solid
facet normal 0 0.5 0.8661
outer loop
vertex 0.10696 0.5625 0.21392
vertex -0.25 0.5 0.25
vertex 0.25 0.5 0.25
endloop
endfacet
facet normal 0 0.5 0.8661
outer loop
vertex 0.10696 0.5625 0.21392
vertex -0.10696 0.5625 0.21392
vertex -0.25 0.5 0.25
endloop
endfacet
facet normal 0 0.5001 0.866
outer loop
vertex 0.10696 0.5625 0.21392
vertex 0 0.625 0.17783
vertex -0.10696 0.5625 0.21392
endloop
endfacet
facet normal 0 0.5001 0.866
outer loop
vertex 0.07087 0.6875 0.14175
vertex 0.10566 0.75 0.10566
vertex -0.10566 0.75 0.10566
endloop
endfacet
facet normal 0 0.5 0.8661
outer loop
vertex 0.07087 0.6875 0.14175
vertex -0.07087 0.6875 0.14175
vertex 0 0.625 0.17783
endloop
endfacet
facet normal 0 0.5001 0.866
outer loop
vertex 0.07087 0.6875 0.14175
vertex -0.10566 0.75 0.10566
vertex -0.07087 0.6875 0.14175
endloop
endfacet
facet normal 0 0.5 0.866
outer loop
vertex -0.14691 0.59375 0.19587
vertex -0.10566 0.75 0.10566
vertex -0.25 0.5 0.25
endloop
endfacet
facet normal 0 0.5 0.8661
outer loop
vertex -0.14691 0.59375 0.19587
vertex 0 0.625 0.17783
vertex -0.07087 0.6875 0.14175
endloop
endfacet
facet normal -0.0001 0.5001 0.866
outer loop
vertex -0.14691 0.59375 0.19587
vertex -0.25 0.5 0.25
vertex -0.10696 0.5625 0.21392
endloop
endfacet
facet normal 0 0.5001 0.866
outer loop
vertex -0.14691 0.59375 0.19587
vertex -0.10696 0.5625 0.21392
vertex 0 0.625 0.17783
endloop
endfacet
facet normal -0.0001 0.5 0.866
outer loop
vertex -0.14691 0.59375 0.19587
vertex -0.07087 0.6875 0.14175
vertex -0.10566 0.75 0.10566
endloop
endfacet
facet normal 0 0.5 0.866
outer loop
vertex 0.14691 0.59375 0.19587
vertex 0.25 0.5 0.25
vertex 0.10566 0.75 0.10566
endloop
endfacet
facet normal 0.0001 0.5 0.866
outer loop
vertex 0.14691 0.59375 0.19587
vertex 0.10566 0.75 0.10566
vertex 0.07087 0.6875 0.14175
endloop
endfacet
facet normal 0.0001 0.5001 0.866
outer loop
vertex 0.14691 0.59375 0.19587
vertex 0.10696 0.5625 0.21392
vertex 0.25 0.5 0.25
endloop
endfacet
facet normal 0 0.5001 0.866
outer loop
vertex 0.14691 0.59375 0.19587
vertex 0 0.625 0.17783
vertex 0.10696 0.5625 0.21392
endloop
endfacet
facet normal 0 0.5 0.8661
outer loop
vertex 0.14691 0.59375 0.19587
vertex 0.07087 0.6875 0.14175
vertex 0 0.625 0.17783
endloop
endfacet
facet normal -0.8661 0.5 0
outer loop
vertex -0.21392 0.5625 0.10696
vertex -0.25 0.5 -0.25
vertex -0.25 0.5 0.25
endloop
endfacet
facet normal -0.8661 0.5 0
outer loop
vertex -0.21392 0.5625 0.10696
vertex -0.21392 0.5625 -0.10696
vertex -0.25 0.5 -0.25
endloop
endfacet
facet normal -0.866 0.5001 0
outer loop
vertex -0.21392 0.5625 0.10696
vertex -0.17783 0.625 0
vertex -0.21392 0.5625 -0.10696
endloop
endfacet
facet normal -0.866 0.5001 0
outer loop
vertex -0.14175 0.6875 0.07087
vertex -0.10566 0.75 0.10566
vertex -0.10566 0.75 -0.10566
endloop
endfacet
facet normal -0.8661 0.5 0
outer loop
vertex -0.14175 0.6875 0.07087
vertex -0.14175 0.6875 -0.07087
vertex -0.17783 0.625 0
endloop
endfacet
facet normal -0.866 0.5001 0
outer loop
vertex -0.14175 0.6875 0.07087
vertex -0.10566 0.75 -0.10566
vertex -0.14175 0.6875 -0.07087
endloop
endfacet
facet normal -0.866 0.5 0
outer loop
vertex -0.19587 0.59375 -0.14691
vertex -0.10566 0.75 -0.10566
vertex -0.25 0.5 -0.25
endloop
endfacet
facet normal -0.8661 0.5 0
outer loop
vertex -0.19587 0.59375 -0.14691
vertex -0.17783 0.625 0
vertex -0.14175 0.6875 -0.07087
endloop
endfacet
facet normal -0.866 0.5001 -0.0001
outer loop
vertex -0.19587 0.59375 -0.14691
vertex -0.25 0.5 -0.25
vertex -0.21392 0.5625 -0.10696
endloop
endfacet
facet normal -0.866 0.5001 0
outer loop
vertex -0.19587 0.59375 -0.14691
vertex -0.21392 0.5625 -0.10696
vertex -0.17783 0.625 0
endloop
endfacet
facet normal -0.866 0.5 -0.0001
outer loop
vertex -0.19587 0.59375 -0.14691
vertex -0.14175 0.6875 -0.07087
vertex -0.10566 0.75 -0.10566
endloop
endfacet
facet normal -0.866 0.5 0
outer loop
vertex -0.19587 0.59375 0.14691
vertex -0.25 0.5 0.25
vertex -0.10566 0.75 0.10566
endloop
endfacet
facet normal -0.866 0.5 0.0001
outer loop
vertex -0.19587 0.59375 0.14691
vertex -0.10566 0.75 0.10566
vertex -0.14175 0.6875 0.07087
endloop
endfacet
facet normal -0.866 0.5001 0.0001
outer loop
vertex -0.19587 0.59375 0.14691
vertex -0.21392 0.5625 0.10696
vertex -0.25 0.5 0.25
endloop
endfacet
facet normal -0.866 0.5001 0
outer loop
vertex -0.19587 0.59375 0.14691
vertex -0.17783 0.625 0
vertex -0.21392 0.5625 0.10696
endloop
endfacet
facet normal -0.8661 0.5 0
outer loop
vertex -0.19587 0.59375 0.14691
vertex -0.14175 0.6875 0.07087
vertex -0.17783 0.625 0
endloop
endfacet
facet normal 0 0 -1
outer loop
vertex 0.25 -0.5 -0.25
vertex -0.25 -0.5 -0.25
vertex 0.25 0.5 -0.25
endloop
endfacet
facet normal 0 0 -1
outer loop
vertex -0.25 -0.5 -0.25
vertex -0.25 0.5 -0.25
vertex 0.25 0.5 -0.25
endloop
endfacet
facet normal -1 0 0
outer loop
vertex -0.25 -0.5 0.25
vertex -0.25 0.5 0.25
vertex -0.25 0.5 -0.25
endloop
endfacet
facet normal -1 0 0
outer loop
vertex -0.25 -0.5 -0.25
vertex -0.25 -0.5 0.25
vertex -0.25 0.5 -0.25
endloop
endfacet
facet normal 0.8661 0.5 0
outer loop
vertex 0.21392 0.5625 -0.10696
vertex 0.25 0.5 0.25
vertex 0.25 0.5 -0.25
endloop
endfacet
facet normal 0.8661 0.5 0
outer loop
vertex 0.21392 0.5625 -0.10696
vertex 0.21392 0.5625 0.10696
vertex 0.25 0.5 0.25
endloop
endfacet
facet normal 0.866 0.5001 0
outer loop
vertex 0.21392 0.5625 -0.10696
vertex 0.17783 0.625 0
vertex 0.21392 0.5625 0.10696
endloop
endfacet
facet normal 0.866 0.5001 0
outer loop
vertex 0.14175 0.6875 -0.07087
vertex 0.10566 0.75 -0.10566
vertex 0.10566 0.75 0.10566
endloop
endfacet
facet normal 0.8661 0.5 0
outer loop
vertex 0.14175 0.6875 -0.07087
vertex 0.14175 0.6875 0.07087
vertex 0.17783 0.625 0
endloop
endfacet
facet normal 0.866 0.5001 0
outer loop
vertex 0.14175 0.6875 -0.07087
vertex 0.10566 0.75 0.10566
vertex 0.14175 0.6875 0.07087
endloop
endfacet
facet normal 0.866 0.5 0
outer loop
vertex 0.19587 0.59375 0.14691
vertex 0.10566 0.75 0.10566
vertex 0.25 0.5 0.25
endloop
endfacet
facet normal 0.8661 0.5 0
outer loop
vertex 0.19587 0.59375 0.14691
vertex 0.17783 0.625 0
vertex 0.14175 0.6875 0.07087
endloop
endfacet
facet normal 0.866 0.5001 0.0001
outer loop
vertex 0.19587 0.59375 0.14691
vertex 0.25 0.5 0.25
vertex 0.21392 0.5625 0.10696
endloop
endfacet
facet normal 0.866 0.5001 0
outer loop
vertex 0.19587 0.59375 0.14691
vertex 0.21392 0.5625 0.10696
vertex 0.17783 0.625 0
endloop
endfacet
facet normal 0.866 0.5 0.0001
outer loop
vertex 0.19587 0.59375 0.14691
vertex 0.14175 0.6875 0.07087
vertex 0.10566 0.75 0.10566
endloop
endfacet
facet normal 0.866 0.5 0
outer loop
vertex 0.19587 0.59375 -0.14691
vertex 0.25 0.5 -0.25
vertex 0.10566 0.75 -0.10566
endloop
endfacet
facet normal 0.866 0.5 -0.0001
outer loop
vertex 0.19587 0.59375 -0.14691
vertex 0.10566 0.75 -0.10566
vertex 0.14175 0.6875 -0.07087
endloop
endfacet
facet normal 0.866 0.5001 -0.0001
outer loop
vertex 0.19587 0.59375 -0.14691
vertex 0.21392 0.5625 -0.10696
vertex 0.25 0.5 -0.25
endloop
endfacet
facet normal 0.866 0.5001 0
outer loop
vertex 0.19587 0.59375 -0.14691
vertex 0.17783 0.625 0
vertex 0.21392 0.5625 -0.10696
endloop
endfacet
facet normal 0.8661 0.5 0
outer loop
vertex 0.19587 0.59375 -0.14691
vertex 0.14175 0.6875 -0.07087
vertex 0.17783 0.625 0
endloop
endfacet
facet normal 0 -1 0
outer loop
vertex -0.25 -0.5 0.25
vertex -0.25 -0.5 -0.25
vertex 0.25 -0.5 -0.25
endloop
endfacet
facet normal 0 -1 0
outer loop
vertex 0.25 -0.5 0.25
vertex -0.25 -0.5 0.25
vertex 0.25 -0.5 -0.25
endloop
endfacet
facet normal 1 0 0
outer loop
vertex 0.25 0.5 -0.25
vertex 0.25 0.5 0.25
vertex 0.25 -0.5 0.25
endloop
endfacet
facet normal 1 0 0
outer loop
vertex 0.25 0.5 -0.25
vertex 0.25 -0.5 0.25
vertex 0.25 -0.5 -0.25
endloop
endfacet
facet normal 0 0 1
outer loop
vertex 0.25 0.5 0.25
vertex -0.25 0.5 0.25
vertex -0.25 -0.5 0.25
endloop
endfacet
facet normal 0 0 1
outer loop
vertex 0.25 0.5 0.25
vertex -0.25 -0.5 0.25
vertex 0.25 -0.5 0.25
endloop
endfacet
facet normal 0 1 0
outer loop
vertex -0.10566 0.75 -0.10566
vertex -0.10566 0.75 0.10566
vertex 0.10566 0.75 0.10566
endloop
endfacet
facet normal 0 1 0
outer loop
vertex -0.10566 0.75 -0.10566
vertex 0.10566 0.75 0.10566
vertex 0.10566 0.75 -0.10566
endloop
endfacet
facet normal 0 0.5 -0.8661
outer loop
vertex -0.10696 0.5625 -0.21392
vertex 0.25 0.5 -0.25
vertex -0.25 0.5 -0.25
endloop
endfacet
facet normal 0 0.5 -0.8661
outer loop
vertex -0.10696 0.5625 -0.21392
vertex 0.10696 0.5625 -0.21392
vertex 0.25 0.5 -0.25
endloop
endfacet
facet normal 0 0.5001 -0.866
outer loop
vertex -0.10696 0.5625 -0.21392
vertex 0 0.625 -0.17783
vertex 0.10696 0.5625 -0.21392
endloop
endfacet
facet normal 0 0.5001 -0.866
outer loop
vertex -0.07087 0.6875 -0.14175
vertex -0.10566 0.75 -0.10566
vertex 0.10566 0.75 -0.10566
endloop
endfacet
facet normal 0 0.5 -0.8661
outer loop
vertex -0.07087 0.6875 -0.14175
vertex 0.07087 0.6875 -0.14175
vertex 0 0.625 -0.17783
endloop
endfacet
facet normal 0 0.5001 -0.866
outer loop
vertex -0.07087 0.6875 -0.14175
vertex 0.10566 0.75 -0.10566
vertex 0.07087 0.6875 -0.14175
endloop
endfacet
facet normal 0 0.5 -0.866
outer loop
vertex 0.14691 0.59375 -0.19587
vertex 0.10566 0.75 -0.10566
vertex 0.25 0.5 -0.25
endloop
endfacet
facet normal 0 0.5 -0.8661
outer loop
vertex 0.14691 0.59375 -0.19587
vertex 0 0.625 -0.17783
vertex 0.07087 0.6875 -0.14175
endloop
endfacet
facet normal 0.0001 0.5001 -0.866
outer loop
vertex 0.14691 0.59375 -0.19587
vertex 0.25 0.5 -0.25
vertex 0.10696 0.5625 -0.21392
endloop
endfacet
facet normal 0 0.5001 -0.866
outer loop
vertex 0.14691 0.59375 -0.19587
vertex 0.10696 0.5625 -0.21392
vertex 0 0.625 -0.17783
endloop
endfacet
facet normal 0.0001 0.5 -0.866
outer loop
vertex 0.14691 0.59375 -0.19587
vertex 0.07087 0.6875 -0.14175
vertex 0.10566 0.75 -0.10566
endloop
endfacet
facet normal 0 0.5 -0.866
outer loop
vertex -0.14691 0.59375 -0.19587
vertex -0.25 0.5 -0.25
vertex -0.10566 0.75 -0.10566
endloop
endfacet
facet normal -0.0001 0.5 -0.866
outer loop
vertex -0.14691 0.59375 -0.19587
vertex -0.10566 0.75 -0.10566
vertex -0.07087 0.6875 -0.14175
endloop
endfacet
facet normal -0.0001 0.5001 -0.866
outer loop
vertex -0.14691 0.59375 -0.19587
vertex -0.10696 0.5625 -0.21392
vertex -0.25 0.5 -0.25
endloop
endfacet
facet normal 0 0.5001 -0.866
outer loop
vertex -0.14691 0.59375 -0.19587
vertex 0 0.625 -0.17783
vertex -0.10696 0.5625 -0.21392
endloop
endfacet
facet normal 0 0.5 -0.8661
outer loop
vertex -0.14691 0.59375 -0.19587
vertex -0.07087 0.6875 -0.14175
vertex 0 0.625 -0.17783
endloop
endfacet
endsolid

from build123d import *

# Parameters (mm, degrees)
SKETCH1_W           = 0.5
SKETCH1_H           = 0.5
BOSS_EXTRUDE1_DEPTH = 0.5
SKETCH2_W           = 0.5
SKETCH2_H           = 0.5
BOSS_EXTRUDE2_DEPTH = 0.25
BOSS_EXTRUDE2_TAPER = 30


with BuildPart() as part:
    # Sketch1 → Boss-Extrude1 (new body, symmetric)
    with BuildSketch(Plane(origin=(0, 0, 0), x_dir=(1, 0, 0), z_dir=(0, 1, 0))):
        Rectangle(SKETCH1_W, SKETCH1_H)
    extrude(amount=BOSS_EXTRUDE1_DEPTH, both=True)

    # Sketch2 → Boss-Extrude2 (add)
    with BuildSketch(Plane(origin=(0, 0.5, 0), x_dir=(1, 0, 0), z_dir=(0, 1, 0))):
        Rectangle(SKETCH2_W, SKETCH2_H)
    extrude(amount=BOSS_EXTRUDE2_DEPTH, taper=BOSS_EXTRUDE2_TAPER)


solid = part.part
